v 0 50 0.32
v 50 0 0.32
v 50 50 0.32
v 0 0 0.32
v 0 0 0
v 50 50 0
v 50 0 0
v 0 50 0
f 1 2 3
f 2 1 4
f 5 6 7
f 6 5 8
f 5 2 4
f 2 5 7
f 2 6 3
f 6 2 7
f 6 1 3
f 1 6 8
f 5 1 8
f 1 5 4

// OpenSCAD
first_layer_height = 0.24;
layer_height = 0.08;

edge = 50;

cube(
    [edge,
    edge,
    first_layer_height+ layer_height,
    ],
    center=false);
